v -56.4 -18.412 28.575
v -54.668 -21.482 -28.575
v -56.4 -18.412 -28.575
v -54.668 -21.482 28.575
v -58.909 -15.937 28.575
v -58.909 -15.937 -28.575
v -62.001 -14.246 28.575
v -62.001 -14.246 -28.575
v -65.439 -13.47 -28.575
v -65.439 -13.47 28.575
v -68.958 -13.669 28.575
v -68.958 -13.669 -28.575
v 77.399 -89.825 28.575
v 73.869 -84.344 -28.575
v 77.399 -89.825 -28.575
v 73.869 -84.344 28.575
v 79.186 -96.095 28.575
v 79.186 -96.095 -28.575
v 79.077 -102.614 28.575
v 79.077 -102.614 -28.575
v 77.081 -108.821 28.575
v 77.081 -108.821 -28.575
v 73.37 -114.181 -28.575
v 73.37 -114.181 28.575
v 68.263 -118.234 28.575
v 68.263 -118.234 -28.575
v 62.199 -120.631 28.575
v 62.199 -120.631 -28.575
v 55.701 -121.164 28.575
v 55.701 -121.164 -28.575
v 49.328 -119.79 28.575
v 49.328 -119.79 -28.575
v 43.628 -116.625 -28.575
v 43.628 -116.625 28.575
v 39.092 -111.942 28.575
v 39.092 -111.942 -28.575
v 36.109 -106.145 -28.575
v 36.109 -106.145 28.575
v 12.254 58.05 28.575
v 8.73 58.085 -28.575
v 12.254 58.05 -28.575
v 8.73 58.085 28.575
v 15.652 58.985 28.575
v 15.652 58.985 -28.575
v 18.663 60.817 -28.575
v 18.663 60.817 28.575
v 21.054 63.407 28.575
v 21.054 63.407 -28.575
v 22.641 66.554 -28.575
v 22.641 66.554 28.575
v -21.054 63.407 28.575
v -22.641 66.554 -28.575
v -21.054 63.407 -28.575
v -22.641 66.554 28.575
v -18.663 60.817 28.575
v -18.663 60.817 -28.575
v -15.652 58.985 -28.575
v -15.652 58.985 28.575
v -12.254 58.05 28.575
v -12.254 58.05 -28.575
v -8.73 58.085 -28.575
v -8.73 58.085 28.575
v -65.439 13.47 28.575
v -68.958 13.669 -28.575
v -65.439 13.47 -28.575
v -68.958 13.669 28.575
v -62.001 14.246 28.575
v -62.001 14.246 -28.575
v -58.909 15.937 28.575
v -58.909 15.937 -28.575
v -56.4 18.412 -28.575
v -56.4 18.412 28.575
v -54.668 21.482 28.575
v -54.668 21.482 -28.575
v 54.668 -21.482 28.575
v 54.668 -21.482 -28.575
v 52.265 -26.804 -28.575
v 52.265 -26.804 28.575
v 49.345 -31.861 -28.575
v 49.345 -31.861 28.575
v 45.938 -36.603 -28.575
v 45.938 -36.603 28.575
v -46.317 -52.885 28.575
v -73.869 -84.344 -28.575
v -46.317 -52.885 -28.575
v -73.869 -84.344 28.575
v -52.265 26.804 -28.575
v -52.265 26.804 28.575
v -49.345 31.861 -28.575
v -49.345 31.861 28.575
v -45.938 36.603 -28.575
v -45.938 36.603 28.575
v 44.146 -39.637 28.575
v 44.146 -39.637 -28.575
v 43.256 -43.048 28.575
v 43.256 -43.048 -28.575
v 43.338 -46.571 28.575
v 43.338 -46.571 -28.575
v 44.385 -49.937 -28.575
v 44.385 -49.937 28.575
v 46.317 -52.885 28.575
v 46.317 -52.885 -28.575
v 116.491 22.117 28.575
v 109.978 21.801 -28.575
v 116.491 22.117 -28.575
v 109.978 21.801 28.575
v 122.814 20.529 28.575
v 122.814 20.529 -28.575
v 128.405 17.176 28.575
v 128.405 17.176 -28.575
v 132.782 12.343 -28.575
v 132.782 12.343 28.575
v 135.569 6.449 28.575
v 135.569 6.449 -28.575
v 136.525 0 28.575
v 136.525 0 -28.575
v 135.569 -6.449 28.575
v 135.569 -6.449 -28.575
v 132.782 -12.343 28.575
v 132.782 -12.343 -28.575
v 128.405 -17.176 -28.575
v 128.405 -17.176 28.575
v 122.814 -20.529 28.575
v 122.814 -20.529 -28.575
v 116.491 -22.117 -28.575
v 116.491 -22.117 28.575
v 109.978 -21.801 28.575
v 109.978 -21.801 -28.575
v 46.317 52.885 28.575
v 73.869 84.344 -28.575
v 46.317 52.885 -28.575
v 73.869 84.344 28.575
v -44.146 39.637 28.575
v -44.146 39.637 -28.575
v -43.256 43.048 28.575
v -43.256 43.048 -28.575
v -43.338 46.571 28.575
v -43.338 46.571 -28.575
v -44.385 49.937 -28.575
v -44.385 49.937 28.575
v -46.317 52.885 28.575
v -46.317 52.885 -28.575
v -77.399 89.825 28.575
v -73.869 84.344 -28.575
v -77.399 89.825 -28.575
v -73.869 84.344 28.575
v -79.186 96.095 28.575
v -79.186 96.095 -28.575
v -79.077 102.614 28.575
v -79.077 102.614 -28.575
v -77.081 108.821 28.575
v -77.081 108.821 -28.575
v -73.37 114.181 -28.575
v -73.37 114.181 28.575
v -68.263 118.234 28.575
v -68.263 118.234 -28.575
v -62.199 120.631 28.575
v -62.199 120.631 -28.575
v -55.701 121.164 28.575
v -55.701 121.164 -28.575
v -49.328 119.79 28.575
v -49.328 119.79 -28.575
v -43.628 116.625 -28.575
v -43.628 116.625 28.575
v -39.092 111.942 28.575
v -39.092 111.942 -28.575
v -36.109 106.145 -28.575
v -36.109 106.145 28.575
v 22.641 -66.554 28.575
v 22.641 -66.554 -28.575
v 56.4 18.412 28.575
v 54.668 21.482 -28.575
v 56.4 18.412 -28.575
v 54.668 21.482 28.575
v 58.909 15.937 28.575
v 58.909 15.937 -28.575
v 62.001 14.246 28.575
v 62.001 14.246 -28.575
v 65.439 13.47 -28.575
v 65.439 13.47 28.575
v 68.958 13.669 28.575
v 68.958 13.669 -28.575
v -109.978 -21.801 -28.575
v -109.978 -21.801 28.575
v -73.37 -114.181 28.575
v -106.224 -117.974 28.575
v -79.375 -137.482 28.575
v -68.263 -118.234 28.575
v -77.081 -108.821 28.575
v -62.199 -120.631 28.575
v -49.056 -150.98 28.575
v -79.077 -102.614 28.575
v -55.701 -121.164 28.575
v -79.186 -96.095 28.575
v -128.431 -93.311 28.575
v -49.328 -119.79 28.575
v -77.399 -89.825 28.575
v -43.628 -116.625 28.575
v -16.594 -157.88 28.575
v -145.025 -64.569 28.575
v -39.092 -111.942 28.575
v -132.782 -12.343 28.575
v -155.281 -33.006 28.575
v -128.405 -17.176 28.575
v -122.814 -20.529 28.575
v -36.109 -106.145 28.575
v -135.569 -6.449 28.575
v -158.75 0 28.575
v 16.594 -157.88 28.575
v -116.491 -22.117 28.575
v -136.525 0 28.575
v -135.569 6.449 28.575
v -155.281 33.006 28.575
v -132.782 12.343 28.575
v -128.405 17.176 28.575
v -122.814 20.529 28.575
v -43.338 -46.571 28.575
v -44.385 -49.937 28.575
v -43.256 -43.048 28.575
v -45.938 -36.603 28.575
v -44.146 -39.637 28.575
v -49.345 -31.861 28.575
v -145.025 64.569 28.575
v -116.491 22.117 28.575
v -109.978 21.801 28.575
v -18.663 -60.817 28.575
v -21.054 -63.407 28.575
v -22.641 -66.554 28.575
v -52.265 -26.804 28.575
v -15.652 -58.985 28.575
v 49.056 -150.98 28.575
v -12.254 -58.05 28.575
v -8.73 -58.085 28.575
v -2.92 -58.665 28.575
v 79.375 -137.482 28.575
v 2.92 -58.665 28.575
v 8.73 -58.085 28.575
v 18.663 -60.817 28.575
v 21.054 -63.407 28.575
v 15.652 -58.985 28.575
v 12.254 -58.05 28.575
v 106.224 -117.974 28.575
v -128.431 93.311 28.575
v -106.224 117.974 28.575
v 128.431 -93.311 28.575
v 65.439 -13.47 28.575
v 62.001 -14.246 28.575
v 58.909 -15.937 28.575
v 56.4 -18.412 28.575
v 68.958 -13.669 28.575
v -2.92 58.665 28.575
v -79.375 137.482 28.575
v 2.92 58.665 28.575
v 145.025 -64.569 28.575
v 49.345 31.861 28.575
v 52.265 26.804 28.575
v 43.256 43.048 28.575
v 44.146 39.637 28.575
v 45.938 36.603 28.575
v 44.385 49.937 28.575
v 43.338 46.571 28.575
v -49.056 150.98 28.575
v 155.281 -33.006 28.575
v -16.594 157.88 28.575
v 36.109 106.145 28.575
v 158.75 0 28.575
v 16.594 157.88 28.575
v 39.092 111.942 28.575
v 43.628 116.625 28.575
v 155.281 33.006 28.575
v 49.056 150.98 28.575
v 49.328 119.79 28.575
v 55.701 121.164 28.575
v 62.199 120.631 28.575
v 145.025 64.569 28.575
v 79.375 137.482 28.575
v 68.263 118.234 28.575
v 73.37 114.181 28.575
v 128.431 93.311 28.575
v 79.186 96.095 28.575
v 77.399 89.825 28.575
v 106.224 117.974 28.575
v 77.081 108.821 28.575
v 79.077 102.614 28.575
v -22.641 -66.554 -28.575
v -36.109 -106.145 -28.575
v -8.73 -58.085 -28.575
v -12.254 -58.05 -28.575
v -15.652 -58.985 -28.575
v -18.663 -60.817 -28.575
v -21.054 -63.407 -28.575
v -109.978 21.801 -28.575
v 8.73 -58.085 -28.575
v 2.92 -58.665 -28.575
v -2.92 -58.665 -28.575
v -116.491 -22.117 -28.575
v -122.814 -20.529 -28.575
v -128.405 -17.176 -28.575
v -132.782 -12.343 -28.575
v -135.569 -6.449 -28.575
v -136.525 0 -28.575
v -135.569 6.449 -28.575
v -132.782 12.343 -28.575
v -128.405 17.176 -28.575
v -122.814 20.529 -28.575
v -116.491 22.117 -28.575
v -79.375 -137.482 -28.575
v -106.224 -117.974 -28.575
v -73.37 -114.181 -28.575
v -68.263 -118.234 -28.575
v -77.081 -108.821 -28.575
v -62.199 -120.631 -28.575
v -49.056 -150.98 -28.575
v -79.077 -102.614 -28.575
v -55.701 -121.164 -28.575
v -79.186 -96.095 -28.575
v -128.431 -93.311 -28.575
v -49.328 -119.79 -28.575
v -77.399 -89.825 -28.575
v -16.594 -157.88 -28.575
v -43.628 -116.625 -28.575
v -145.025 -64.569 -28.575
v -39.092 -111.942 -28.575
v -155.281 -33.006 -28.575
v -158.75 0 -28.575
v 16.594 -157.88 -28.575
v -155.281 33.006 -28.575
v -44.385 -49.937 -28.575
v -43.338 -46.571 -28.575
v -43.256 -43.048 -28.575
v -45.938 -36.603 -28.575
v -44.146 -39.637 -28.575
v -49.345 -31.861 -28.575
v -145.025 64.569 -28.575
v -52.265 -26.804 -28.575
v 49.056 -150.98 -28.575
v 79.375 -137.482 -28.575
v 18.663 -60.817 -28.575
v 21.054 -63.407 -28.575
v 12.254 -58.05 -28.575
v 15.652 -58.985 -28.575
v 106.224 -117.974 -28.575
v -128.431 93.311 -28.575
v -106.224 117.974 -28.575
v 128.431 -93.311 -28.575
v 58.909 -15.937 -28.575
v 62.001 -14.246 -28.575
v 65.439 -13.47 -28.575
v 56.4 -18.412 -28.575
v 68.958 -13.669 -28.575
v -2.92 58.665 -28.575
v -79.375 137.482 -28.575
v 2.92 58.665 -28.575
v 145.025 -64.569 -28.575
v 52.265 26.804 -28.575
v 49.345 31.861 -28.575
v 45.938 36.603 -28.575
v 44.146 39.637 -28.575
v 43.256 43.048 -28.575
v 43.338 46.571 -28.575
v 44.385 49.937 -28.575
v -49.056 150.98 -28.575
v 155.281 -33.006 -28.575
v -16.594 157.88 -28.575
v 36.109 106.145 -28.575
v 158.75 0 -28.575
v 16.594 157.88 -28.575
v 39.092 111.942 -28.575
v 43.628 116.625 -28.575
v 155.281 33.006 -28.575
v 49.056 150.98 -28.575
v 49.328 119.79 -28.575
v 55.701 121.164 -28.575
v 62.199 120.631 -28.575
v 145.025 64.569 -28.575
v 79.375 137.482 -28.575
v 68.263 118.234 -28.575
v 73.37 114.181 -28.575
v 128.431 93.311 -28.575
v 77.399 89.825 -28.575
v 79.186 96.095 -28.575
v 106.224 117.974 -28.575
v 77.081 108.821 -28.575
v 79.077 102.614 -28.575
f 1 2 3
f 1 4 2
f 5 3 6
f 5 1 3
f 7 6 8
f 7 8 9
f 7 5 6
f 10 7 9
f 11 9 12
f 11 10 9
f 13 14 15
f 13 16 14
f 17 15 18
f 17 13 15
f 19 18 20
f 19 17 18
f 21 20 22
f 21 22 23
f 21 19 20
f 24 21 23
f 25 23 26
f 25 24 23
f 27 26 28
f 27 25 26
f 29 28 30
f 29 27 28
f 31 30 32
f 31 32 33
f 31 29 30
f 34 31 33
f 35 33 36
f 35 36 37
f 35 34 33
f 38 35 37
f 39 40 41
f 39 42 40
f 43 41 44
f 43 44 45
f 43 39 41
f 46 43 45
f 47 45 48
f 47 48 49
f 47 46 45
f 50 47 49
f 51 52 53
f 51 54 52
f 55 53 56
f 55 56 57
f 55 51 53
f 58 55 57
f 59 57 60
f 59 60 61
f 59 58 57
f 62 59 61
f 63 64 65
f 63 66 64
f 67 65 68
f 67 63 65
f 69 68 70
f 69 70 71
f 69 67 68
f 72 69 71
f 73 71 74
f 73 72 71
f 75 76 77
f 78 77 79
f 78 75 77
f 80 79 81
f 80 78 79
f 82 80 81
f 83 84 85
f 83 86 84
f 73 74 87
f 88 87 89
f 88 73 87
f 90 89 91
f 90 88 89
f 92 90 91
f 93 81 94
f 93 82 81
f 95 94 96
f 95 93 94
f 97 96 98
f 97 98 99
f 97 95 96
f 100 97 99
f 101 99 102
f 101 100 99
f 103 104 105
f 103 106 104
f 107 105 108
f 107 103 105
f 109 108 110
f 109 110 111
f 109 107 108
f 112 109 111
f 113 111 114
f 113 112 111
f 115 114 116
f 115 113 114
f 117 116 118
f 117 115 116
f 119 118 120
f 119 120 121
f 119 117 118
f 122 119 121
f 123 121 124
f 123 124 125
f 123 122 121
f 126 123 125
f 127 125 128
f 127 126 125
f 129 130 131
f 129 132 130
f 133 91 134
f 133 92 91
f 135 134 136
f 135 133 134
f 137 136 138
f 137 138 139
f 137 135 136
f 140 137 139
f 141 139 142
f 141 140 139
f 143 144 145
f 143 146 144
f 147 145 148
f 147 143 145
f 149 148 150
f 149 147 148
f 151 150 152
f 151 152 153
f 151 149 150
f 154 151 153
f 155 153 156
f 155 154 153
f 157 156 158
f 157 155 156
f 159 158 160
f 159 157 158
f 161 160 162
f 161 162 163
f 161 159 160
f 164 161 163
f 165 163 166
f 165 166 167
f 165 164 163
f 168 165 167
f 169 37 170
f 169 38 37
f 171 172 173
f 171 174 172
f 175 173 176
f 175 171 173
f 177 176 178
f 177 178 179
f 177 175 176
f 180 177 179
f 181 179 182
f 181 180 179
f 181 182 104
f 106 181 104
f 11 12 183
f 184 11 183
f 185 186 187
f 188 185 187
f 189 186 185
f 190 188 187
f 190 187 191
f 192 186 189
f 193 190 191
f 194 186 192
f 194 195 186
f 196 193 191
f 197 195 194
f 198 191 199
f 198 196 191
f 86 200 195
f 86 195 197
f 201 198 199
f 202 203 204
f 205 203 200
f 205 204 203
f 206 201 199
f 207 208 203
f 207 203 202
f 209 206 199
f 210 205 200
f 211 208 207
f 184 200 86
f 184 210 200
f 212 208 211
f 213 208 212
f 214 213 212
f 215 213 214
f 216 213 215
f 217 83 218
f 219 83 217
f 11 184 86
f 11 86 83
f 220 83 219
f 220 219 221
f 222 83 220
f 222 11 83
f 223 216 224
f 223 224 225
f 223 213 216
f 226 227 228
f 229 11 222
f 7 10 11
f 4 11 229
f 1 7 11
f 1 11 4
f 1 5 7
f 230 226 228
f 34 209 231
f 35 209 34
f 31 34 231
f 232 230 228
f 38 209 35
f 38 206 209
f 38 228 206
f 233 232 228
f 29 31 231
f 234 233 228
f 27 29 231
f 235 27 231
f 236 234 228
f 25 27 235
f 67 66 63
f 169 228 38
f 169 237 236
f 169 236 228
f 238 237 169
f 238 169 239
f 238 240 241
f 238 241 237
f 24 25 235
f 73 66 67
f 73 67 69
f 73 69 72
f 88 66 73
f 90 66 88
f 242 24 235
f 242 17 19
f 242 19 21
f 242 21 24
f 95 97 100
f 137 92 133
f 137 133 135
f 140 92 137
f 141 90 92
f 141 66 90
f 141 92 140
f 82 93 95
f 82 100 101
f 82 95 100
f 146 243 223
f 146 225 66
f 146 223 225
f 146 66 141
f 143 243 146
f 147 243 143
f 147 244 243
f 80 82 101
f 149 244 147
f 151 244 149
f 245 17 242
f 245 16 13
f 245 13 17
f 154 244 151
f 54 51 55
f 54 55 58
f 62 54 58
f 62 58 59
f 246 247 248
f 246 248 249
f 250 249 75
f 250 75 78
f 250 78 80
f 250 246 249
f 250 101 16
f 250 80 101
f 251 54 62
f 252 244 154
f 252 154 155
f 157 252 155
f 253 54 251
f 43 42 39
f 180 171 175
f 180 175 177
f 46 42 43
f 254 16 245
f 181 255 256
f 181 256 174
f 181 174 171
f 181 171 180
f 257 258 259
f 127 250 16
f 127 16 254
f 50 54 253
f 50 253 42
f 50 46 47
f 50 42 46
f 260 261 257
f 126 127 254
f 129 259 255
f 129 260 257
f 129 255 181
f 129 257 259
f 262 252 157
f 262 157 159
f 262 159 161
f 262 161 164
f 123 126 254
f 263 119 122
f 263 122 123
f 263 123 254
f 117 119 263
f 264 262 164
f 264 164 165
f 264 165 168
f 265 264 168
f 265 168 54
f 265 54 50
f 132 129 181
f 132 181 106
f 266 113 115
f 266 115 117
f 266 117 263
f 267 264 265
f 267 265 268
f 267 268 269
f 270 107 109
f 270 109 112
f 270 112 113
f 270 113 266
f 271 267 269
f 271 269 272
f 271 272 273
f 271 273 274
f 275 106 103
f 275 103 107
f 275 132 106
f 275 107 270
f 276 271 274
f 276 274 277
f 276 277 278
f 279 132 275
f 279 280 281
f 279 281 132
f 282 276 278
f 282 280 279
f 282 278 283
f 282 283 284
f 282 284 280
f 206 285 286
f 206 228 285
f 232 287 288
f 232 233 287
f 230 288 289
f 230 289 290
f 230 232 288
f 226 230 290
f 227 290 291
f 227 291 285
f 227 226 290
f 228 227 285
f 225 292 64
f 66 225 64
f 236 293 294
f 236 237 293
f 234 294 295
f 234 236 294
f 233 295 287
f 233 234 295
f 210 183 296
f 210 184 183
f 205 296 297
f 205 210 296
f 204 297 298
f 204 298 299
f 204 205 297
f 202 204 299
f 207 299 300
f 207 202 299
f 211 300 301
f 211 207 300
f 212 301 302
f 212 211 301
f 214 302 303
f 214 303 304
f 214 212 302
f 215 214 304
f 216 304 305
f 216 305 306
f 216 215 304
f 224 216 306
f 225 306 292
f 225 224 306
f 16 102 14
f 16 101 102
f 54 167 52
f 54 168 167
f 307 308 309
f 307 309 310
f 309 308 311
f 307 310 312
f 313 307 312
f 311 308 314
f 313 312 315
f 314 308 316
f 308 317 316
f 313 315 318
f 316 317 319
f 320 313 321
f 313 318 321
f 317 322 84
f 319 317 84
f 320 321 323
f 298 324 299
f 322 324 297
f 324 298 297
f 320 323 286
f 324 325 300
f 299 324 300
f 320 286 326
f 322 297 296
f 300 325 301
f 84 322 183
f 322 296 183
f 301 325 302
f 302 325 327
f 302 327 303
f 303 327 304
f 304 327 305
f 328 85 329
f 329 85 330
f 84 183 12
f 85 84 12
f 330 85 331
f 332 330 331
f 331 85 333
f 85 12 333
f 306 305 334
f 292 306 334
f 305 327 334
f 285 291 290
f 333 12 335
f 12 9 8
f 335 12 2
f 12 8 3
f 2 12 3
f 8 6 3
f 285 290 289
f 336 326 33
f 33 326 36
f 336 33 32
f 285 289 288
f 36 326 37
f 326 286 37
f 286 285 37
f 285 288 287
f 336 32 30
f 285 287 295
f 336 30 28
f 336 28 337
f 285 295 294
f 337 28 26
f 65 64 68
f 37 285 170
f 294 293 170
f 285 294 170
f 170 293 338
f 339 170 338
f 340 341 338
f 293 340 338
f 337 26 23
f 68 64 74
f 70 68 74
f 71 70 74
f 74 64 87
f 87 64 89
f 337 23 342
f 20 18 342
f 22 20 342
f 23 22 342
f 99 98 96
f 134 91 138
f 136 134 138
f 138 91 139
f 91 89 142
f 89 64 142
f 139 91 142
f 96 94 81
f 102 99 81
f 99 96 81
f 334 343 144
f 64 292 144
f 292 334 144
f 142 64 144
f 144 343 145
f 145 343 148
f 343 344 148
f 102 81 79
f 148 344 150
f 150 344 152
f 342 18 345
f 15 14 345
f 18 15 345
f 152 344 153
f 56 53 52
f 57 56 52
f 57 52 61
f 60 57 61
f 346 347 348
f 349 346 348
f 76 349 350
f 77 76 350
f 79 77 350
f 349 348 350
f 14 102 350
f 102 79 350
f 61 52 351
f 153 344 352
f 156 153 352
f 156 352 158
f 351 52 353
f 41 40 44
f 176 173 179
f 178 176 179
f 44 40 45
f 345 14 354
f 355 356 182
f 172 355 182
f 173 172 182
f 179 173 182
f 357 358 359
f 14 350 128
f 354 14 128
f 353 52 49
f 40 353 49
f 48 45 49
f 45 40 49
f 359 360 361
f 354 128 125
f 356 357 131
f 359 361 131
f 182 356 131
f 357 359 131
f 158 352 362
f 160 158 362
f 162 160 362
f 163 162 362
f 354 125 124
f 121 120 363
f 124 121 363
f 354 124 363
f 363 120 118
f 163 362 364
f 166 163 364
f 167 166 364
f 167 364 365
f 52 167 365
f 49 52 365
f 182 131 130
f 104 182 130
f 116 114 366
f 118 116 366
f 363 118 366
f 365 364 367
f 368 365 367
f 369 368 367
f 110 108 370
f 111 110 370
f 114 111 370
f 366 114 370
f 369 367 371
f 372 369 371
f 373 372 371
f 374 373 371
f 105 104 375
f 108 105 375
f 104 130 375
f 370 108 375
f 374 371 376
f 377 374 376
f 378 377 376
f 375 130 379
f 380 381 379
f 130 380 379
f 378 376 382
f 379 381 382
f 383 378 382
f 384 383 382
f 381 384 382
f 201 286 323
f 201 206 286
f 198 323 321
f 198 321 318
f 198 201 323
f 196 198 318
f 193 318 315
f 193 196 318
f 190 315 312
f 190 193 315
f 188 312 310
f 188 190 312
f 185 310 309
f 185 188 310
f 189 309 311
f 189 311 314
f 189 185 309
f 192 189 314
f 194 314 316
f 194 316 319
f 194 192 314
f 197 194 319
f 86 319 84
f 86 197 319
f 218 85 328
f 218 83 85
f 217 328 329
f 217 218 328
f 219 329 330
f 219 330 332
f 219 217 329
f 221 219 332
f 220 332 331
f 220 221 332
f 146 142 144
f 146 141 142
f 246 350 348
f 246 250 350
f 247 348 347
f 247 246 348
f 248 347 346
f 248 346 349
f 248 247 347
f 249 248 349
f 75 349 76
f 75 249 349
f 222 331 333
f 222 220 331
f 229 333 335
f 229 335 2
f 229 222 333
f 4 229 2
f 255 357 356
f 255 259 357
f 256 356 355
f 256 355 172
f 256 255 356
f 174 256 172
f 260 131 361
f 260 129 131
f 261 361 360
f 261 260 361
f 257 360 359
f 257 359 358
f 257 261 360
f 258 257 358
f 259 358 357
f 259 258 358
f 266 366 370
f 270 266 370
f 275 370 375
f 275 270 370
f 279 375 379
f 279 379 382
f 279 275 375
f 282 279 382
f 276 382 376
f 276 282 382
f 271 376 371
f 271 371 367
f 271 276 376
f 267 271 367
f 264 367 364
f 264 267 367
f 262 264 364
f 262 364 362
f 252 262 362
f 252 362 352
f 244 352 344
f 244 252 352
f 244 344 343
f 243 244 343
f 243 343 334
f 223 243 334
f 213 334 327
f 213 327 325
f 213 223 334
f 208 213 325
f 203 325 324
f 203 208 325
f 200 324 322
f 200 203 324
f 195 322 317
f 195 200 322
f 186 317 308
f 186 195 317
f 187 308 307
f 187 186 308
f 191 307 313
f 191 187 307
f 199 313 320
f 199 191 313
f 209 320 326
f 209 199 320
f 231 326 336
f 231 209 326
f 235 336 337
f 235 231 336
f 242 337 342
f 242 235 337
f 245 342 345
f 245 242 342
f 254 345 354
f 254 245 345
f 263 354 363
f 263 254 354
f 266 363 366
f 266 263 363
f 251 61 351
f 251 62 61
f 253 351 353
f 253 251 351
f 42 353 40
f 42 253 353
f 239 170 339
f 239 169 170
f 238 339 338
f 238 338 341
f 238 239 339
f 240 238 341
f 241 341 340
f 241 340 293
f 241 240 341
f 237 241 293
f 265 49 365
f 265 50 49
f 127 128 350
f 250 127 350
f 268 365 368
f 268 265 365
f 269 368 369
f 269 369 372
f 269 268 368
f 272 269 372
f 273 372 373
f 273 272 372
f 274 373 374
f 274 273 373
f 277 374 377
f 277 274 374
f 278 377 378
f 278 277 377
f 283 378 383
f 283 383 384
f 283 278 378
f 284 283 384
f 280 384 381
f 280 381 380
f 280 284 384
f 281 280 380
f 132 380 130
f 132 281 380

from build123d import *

# Parameters (mm, degrees)
SKETCH1_R           = 158.75
BOSS_EXTRUDE1_DEPTH = 28.575


with BuildPart() as part:
    # Sketch1 → Boss-Extrude1 (new, symmetric)
    with BuildSketch(Plane(origin=(0, 0, 0), x_dir=(0, 1, 0), z_dir=(0, 0, 1))):
        with Locations(Location((0, 0, 0), (0, 0, 270))):
            Circle(SKETCH1_R)
        with BuildLine():
            Line((21.800803257, 109.978472222), (13.669356496, 68.957777656))
            ThreePointArc((13.669356496, 68.957777656), (14.983750202, 60.395804017), (21.482165761, 54.668185085))
            ThreePointArc((21.482165761, 54.668185085), (29.36875, 50.868167155), (36.602954182, 45.93819382))
            ThreePointArc((36.602954182, 45.93819382), (44.81242546, 43.174210327), (52.88450899, 46.316898807))
            Line((52.88450899, 46.316898807), (84.343749185, 73.869285555))
            ThreePointArc((84.343749185, 73.869285555), (118.234118252, 68.2625), (106.144552443, 36.109186667))
            Line((106.144552443, 36.109186667), (66.553865487, 22.640878849))
            ThreePointArc((66.553865487, 22.640878849), (59.796175661, 17.22159369), (58.085119943, 8.729991265))
            ThreePointArc((58.085119943, 8.729991265), (58.7375, 0), (58.085119943, -8.729991265))
            ThreePointArc((58.085119943, -8.729991265), (59.796175661, -17.22159369), (66.553865487, -22.640878849))
            Line((66.553865487, -22.640878849), (106.144552443, -36.109186667))
            ThreePointArc((106.144552443, -36.109186667), (118.234118252, -68.2625), (84.343749185, -73.869285555))
            Line((84.343749185, -73.869285555), (52.88450899, -46.316898807))
            ThreePointArc((52.88450899, -46.316898807), (44.81242546, -43.174210327), (36.602954182, -45.93819382))
            ThreePointArc((36.602954182, -45.93819382), (29.36875, -50.868167155), (21.482165761, -54.668185085))
            ThreePointArc((21.482165761, -54.668185085), (14.983750202, -60.395804017), (13.669356496, -68.957777656))
            Line((13.669356496, -68.957777656), (21.800803257, -109.978472222))
            ThreePointArc((21.800803257, -109.978472222), (0, -136.525), (-21.800803257, -109.978472222))
            Line((-21.800803257, -109.978472222), (-13.669356496, -68.957777656))
            ThreePointArc((-13.669356496, -68.957777656), (-14.983750202, -60.395804017), (-21.482165761, -54.668185085))
            ThreePointArc((-21.482165761, -54.668185085), (-29.36875, -50.868167155), (-36.602954182, -45.93819382))
            ThreePointArc((-36.602954182, -45.93819382), (-44.81242546, -43.174210327), (-52.88450899, -46.316898807))
            Line((-52.88450899, -46.316898807), (-84.343749185, -73.869285555))
            ThreePointArc((-84.343749185, -73.869285555), (-118.234118252, -68.2625), (-106.144552443, -36.109186667))
            Line((-106.144552443, -36.109186667), (-66.553865487, -22.640878849))
            ThreePointArc((-66.553865487, -22.640878849), (-59.796175661, -17.22159369), (-58.085119943, -8.729991265))
            ThreePointArc((-58.085119943, -8.729991265), (-58.7375, 0), (-58.085119943, 8.729991265))
            ThreePointArc((-58.085119943, 8.729991265), (-59.796175661, 17.22159369), (-66.553865487, 22.640878849))
            Line((-66.553865487, 22.640878849), (-106.144552443, 36.109186667))
            ThreePointArc((-106.144552443, 36.109186667), (-118.234118252, 68.2625), (-84.343749185, 73.869285555))
            Line((-84.343749185, 73.869285555), (-52.88450899, 46.316898807))
            ThreePointArc((-52.88450899, 46.316898807), (-44.81242546, 43.174210327), (-36.602954182, 45.93819382))
            ThreePointArc((-36.602954182, 45.93819382), (-29.36875, 50.868167155), (-21.482165761, 54.668185085))
            ThreePointArc((-21.482165761, 54.668185085), (-14.983750202, 60.395804017), (-13.669356496, 68.957777656))
            Line((-13.669356496, 68.957777656), (-21.800803257, 109.978472222))
            ThreePointArc((-21.800803257, 109.978472222), (0, 136.525), (21.800803257, 109.978472222))
        make_face(mode=Mode.SUBTRACT)
    extrude(amount=BOSS_EXTRUDE1_DEPTH, both=True)


solid = part.part
